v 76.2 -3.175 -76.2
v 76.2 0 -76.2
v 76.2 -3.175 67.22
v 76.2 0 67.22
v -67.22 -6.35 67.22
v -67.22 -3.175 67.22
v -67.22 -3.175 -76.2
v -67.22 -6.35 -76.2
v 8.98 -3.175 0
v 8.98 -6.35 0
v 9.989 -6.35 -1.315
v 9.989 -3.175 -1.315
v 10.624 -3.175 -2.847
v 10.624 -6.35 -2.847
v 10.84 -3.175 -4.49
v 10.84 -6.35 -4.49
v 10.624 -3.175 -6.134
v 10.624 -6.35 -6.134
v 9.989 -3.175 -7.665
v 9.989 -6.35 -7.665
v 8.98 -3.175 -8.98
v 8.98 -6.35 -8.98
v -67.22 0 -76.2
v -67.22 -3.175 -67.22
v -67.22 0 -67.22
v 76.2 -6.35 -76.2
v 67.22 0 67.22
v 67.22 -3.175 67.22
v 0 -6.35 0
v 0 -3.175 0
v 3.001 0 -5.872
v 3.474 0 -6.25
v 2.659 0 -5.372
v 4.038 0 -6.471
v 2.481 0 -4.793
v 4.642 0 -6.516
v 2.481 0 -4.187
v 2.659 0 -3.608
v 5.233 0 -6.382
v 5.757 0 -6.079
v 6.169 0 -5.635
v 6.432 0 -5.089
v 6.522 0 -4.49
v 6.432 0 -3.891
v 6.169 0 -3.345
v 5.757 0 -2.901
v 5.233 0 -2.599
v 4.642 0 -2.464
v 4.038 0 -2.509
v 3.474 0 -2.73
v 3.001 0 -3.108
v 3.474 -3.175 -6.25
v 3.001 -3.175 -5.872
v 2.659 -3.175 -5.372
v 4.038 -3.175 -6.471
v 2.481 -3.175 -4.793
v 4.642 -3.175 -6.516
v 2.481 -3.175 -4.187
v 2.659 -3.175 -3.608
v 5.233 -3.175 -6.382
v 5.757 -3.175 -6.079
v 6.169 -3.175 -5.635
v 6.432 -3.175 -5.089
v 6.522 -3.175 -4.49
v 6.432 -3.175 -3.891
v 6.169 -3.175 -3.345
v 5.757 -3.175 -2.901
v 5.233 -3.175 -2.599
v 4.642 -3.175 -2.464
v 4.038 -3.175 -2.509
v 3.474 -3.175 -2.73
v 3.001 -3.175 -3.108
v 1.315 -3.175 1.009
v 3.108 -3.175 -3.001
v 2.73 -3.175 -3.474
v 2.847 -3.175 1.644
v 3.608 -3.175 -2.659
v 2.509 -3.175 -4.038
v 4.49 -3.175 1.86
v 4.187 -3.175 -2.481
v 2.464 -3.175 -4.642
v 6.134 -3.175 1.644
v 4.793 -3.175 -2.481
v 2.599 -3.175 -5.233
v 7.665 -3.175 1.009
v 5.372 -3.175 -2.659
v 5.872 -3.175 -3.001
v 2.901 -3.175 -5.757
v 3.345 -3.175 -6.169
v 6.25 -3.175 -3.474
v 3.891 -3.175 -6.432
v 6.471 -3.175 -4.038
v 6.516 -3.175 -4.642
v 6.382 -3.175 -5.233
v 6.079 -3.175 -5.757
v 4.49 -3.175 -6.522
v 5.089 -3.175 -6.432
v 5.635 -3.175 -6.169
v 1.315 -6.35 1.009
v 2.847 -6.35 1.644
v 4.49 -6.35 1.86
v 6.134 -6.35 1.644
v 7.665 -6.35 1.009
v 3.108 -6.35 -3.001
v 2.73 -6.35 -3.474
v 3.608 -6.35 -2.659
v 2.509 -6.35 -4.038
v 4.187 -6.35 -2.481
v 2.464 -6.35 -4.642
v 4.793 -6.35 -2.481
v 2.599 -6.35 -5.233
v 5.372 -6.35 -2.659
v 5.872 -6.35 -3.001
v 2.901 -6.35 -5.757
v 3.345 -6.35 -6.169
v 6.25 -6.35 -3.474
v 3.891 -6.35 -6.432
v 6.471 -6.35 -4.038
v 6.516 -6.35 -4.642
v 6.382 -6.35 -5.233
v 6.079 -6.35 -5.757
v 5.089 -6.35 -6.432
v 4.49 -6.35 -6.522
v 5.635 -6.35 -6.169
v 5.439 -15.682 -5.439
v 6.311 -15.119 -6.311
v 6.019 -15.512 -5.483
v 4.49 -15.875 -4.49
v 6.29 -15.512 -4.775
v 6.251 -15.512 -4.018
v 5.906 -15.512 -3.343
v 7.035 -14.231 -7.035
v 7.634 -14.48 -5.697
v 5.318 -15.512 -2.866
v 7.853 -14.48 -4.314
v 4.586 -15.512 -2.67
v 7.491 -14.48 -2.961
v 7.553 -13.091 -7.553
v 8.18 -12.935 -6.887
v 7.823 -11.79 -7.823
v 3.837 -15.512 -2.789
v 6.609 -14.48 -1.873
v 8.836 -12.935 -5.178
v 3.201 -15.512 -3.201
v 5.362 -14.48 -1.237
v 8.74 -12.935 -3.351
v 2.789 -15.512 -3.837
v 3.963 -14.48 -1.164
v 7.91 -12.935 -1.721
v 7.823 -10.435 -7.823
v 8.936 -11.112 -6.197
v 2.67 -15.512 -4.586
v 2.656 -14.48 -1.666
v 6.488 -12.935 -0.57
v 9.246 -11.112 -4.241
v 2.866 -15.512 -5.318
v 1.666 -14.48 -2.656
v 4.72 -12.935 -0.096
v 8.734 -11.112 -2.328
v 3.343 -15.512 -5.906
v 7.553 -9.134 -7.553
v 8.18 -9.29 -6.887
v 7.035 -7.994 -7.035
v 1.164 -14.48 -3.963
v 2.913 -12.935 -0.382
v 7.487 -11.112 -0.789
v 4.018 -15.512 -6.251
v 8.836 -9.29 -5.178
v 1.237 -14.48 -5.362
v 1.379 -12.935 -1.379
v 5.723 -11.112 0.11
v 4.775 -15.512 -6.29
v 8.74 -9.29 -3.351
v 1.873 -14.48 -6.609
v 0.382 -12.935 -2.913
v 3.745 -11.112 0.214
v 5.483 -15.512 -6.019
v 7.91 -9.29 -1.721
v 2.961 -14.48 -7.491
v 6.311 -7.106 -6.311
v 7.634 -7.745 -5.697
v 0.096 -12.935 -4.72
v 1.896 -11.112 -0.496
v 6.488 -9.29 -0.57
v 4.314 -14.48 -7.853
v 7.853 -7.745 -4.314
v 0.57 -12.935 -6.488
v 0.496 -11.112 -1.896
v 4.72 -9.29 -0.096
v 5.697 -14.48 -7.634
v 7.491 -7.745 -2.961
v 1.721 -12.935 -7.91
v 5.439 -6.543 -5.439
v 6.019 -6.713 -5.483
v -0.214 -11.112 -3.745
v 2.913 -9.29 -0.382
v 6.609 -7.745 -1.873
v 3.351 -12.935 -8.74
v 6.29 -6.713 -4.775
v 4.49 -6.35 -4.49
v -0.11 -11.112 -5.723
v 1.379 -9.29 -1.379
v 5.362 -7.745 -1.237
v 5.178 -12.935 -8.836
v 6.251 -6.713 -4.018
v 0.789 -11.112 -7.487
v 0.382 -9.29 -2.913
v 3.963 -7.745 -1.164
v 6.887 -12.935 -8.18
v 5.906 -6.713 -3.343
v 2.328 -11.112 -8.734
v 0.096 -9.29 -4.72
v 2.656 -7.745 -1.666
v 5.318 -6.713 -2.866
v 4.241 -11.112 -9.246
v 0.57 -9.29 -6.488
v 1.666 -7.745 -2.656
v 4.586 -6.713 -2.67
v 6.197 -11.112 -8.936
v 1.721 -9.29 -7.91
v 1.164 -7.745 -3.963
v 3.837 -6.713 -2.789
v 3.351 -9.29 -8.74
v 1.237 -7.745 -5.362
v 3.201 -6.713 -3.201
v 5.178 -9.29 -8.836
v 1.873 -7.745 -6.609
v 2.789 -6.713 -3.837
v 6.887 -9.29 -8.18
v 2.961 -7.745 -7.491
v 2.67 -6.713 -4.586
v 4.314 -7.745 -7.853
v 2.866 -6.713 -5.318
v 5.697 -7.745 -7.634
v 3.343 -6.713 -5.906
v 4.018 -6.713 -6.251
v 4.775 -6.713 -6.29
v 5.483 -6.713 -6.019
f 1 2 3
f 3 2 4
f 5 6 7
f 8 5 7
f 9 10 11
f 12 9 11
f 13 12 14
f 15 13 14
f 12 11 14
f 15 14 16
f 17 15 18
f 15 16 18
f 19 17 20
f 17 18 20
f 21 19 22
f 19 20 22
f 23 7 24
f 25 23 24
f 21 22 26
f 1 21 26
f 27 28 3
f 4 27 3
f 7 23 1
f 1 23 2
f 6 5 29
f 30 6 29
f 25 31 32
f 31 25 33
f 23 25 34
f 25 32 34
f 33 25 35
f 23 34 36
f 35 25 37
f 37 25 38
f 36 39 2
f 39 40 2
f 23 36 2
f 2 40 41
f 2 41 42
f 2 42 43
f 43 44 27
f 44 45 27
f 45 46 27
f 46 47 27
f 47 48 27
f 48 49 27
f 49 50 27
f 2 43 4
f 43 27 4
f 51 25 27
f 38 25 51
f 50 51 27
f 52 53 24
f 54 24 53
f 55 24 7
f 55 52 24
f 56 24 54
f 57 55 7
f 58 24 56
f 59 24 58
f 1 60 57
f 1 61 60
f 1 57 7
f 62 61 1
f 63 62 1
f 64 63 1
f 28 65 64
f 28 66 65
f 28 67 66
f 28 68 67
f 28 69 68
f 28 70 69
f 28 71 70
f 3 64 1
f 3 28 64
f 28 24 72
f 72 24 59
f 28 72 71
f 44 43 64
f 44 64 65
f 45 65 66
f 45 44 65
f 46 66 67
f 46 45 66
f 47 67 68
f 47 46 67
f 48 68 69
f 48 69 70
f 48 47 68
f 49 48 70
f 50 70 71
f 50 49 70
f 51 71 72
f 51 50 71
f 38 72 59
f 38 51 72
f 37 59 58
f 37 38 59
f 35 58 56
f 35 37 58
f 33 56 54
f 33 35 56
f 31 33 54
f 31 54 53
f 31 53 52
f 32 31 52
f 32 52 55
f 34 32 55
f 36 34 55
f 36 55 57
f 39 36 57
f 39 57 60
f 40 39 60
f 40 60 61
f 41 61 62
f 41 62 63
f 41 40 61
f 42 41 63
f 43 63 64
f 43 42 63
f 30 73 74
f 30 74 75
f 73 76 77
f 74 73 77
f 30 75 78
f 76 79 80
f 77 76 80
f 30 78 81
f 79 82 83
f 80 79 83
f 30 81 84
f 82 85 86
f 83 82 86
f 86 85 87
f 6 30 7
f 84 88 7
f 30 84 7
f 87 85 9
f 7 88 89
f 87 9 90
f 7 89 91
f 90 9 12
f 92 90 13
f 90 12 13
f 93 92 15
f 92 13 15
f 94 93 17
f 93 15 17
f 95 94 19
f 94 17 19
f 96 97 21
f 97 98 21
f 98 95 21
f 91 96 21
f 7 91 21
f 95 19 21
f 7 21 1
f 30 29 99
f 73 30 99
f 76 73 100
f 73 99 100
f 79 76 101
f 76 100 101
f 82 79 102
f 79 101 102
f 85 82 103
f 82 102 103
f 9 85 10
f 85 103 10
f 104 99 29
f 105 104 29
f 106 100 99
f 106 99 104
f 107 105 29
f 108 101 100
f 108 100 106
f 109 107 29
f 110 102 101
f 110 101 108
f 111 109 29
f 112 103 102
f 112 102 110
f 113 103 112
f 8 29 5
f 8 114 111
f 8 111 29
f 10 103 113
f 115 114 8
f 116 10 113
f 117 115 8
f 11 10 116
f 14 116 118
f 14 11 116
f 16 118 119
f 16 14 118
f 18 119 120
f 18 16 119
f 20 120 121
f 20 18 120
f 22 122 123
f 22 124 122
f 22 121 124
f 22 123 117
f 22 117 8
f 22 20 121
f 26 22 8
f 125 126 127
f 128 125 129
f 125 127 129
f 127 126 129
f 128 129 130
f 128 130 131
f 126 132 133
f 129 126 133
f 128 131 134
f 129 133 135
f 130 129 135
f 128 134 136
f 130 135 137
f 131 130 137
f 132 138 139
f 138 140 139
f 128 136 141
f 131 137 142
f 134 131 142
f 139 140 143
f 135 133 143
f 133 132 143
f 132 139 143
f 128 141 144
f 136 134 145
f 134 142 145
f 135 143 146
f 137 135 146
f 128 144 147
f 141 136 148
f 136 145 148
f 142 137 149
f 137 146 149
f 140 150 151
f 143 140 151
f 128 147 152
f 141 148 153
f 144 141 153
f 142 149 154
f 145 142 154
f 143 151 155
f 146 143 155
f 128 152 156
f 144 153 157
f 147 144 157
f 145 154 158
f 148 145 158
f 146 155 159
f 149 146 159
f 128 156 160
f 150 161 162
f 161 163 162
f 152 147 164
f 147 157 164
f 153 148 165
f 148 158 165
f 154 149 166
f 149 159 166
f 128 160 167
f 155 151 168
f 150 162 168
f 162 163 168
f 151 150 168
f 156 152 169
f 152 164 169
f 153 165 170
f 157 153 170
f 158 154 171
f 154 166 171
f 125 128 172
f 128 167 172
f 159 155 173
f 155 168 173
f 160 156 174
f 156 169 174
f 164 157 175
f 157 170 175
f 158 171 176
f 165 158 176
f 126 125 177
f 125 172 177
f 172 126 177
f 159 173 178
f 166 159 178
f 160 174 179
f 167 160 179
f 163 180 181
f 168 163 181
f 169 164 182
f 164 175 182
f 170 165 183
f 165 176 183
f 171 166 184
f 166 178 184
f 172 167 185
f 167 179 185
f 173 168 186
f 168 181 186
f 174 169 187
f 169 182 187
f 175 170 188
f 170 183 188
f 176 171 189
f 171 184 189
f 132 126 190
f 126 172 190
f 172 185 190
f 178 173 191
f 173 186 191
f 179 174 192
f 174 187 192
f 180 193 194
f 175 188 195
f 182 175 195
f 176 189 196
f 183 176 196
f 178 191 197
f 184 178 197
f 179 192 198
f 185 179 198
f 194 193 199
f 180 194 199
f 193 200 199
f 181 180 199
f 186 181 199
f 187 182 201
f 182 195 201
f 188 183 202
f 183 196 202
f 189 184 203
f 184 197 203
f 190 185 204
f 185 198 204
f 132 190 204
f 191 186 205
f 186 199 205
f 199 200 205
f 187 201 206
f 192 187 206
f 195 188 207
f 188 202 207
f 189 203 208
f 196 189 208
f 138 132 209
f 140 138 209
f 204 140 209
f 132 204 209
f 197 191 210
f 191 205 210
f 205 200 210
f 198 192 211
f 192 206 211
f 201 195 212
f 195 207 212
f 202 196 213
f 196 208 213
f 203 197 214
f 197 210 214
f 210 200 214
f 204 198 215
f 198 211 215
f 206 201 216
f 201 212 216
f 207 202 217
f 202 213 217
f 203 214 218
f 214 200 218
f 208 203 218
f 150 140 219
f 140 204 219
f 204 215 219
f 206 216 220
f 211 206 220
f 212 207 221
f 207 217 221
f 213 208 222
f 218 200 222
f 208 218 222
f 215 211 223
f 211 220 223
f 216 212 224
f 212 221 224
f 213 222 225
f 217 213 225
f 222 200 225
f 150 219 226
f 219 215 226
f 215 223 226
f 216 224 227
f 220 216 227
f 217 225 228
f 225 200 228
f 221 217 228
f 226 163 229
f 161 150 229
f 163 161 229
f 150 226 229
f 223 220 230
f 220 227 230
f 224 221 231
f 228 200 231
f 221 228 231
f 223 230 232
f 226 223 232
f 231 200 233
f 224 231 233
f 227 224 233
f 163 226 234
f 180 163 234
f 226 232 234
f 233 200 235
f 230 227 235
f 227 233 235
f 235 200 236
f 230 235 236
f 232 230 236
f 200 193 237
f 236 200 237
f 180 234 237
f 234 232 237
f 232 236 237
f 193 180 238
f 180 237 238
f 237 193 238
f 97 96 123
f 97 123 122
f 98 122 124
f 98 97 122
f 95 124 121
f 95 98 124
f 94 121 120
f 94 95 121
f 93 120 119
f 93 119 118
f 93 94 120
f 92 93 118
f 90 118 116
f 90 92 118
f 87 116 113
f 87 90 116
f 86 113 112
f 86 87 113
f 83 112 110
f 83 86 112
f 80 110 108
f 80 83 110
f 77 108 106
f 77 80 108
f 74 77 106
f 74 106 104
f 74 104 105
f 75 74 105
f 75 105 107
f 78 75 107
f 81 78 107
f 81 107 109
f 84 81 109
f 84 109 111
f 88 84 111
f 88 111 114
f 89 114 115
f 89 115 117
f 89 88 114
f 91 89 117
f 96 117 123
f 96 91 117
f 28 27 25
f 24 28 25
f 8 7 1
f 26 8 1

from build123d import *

# Parameters (mm, degrees)
F0_R      = 2.032
F1_DEPTH  = 3.175
F4_ANGLE  = 90
F6_R      = 6.35
F7_DEPTH  = 6.35
F9_DEPTH  = 3.175
F13_ANGLE = 180
F16_DEPTH = 3.176


# Not quite as in the source:
# - a feature of the source that left no trace in its solid (it failed there, or was rolled back) is left out


with BuildPart() as f1:
    # F0 (on Front) → F1 (new body)
    with BuildSketch(Plane.XZ):
        Polygon((76.2, 76.2), (-76.2, -76.2), (76.2, -76.2), align=None)
        with Locations((4.4901280605, -4.4901280605)):
            Circle(F0_R, mode=Mode.SUBTRACT)
    extrude(amount=F1_DEPTH)


with BuildPart() as f4_1:
    # F4: copy of F1
    add(f1.part.rotate(Axis((4.4901280605, -59.5605373383, -4.4901280605), (0, -1, 0)), F4_ANGLE))


with BuildPart() as f4_1_1:
    # F5: moved
    add(f4_1.part.moved(Location((0, -3.175, 0))))

    # F8 (on face) → F9 (cut, through all)
    with BuildSketch(Plane.XZ.offset(6.35)):
        with BuildLine():
            ThreePointArc((8.9802561211, -8.9802561211), (4.4901280539, -10.8401280605), (-9.4e-09, -8.9802561117))
            Line((-9.4e-09, -8.9802561117), (76.2, -85.1802561211))
            Line((76.2, -85.1802561211), (76.2, -76.2))
            Line((76.2, -76.2), (8.9802561211, -8.9802561211))
        make_face()
        with BuildLine():
            ThreePointArc((-9.4e-09, -8.9802561117), (-1.8598719395, -4.4901280539), (0, 0))
            Line((0, 0), (-67.2197438789, 67.2197438789))
            Line((-67.2197438789, 67.2197438789), (-76.2, 67.2197438789))
            Line((-76.2, 67.2197438789), (-9.4e-09, -8.9802561117))
        make_face()
    extrude(amount=-F9_DEPTH, mode=Mode.SUBTRACT)


with BuildPart() as f7:
    # F6 (on face) → F7 (new body)
    with BuildSketch(Plane.XZ.offset(6.35)):
        with Locations((4.4901280605, -4.4901280605)):
            Circle(F6_R)
    extrude(amount=F7_DEPTH)


with BuildPart() as f4_1_2:
    # F13: moved
    add(f4_1_1.part.rotate(Axis((4.4901280605, -59.5605373383, -4.4901280605), (0, -1, 0)), F13_ANGLE))


with BuildPart() as f1_1:
    add(f1.part)

    # F15 (on face) → F16 (cut, through all)
    with BuildSketch(Plane.XZ.offset(3.175)):
        Polygon((-76.2, -76.2), (-67.2197438789, -76.2), (-67.2197438789, -67.2197438789), align=None)
        Polygon((67.2197438789, 67.2197438789), (76.2, 67.2197438789), (76.2, 76.2), align=None)
    extrude(amount=-F16_DEPTH, mode=Mode.SUBTRACT)


with BuildPart() as f19:
    # F18 (on face) → F19 (revolve)
    with BuildSketch(Plane(origin=(0, 0, 0), x_dir=(0.7071067812, 0, -0.7071067812), z_dir=(0.7071067812, 0, 0.7071067812))):
        with BuildLine():
            Line((6.35, -6.35), (6.35, -15.875))
            ThreePointArc((6.35, -15.875), (11.1125, -11.1125), (6.35, -6.35))
        make_face()
    revolve(axis=Axis((4.4901280605, -17.9845464677, -4.4901280605), (0, -1, 0)))


solid = Compound([f4_1_2.part, f1_1.part, f19.part])
